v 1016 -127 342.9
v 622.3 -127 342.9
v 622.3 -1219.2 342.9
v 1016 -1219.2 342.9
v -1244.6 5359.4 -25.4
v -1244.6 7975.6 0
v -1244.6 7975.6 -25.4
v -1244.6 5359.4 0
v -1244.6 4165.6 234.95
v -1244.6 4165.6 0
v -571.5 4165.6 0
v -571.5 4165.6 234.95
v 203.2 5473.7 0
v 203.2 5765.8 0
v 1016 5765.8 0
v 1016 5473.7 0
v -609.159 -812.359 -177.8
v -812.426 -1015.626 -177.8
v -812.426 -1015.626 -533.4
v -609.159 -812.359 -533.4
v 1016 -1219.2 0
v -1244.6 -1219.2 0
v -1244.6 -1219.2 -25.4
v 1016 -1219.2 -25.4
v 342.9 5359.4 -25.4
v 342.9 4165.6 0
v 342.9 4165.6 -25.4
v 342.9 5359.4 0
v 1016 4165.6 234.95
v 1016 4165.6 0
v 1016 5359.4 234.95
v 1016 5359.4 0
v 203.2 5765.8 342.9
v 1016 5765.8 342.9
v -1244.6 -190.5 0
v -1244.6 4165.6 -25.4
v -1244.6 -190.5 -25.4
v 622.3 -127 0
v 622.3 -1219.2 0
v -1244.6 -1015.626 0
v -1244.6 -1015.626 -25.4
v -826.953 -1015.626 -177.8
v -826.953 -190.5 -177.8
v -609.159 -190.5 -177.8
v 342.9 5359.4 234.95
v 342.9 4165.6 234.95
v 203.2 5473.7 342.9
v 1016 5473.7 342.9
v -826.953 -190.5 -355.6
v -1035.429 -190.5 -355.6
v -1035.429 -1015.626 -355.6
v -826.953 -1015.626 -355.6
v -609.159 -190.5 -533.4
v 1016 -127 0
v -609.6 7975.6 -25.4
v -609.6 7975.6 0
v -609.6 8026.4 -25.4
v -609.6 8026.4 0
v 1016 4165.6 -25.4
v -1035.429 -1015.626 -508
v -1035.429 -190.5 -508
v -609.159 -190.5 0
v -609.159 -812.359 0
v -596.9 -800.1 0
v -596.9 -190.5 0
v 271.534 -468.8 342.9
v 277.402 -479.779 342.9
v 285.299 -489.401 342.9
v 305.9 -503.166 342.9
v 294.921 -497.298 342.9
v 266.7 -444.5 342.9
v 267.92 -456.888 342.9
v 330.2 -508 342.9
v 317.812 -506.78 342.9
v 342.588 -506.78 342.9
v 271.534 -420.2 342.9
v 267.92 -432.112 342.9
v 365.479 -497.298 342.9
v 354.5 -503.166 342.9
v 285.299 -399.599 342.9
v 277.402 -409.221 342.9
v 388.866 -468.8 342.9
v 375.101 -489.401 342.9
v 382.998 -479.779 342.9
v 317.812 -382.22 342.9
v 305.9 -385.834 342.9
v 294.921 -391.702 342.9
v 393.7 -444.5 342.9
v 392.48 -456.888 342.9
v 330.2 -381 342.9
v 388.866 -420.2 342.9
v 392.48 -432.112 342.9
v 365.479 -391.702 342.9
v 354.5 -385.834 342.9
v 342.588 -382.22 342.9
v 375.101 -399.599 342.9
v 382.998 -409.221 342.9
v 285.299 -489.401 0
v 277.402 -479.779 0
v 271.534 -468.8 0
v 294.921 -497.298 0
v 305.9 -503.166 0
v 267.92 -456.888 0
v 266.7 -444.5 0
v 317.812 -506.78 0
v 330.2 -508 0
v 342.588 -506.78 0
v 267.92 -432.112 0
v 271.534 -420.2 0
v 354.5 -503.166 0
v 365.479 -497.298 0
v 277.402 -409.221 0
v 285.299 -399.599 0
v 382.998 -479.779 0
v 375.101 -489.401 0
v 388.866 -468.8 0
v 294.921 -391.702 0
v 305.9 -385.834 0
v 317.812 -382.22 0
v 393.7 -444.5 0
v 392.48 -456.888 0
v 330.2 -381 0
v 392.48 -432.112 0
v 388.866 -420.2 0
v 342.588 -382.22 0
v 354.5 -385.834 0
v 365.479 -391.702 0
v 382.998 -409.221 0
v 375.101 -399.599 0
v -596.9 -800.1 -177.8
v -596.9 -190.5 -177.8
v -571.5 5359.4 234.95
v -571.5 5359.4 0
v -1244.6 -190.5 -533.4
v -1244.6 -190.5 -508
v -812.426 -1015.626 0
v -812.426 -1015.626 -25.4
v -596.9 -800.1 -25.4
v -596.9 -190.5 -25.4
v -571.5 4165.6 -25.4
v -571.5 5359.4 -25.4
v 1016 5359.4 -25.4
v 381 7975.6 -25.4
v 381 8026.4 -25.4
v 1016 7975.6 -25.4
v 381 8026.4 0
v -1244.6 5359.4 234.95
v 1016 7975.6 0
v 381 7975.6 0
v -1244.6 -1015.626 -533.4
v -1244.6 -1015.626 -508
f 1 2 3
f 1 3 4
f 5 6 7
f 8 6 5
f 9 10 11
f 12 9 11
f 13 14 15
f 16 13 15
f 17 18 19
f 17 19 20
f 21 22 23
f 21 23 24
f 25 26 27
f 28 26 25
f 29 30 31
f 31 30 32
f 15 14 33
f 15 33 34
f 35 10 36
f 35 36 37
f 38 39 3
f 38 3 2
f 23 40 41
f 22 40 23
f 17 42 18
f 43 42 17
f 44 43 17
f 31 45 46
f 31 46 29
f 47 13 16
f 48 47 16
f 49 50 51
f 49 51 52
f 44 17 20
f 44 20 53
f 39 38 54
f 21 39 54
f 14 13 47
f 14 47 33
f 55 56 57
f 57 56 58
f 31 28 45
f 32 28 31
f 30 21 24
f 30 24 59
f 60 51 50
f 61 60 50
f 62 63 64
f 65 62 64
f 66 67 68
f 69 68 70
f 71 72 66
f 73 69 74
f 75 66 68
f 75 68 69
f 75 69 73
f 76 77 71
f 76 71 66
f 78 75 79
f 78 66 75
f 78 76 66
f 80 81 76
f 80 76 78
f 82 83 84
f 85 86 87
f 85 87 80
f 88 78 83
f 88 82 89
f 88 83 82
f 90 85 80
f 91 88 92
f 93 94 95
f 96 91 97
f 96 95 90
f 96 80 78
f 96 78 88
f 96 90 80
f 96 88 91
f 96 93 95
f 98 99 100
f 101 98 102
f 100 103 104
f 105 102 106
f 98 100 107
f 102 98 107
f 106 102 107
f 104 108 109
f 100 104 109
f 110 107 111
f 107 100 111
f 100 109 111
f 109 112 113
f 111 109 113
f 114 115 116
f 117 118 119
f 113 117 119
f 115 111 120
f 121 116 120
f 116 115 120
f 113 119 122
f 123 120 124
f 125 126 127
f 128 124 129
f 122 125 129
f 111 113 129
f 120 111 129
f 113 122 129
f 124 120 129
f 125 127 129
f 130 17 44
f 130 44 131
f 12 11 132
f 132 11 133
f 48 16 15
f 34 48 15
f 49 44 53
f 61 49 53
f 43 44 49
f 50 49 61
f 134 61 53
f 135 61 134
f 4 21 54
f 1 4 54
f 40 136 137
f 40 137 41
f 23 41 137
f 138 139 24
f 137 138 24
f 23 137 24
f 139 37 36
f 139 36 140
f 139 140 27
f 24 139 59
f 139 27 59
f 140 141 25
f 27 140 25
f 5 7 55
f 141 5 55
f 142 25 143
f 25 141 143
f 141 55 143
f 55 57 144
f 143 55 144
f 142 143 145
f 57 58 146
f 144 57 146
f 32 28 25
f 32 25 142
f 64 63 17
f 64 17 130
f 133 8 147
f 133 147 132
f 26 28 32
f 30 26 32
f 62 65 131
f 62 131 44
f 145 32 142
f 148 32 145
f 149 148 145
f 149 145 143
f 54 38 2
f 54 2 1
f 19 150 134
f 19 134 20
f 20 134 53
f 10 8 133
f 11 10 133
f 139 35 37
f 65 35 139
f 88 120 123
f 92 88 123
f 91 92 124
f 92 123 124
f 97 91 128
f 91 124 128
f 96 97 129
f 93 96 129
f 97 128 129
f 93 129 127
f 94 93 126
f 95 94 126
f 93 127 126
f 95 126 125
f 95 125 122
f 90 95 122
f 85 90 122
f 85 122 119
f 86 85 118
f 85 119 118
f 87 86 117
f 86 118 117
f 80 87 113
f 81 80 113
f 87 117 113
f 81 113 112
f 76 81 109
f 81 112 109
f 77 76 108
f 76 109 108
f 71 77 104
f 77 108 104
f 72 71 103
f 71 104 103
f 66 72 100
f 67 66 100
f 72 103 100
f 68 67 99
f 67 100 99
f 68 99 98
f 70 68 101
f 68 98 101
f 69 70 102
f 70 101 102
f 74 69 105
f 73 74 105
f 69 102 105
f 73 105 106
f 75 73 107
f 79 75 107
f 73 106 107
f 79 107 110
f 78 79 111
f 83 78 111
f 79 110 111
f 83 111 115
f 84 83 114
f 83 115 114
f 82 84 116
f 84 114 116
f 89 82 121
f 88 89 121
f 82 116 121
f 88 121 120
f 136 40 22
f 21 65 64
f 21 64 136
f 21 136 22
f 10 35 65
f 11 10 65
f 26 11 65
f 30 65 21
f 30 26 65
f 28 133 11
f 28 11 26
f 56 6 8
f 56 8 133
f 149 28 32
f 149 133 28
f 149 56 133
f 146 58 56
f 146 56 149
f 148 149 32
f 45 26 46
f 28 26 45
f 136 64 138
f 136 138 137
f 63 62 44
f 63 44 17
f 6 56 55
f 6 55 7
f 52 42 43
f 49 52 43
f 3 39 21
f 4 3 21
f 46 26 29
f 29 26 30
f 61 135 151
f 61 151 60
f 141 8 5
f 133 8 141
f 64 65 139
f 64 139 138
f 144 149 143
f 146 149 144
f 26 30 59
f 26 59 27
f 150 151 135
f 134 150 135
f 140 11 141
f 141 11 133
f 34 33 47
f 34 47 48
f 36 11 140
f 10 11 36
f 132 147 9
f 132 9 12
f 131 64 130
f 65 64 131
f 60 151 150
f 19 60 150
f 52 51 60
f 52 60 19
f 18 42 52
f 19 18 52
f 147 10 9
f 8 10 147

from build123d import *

# Parameters (mm, degrees)
F0_W      = 1016
F0_H      = 1930.4
F0_W_2    = 914.4
F0_H_2    = 1193.8
F0_W_3    = 990.6
F0_H_3    = 50.8
F1_DEPTH  = 25.4
F0_W_4    = 673.1
F2_DEPTH  = 234.95
F4_W      = 812.8
F4_H      = 292.1
F5_DEPTH  = 342.9
F4_R      = 63.5
F4_W_2    = 393.7
F4_H_2    = 1092.2
F6_DEPTH  = 177.8
F0_W_5    = 209.1705223083
F0_H_4    = 825.1261469057
F0_W_6    = 208.4766030312
F7_DEPTH  = 533.4
F8_DEPTH  = 508
F9_DEPTH  = 355.6
F10_DEPTH = 177.8


with BuildPart() as f1:
    # F0 (on Top) → F1 (new body)
    with BuildSketch(Plane.XY):
        Polygon((-1244.6, 0), (0, 0), (0, 1930.4), (-203.2, 1930.4), (-203.2, 4064), (1016, 4064), (1016, 4165.6), (342.9, 4165.6), (-571.5, 4165.6), (-1244.6, 4165.6), (-1244.6, 1651), (-635, 1270), (-635, 635), (-1244.6, 635), align=None)
        Polygon((-203.2, 1930.4), (0, 1930.4), (1016, 1930.4), (1016, 4064), (-203.2, 4064), align=None)
        with Locations((508, 965.2)):
            Rectangle(F0_W, F0_H)
        Polygon((-1244.6, 1244.6), (-1244.6, 635), (-635, 635), (-635, 1270), (-1244.6, 1651), align=None)
        with Locations((-114.3, 4762.5)):
            Rectangle(F0_W_2, F0_H_2)
        Polygon((342.9, 5359.4), (1016, 5359.4), (1016, 7975.6), (381, 7975.6), (-609.6, 7975.6), (-1244.6, 7975.6), (-1244.6, 5359.4), (-571.5, 5359.4), align=None)
        with Locations((-114.3, 8001)):
            Rectangle(F0_W_3, F0_H_3)
        Polygon((1016, 0), (0, 0), (-1244.6, 0), (-1244.6, -190.5), (-1035.4294776917, -190.5), (-826.9528746605, -190.5), (-609.1586947441, -190.5), (-596.9, -190.5), (-596.9, -800.1), (-609.1586947441, -812.3586947441), (-812.4261469057, -1015.6261469057), (-826.9528746605, -1015.6261469057), (-1035.4294776917, -1015.6261469057), (-1244.6, -1015.6261469057), (-1244.6, -1219.2), (1016, -1219.2), align=None)
    extrude(amount=-F1_DEPTH)


with BuildPart() as f2:
    # F0 (on Top) → F2 (new body)
    with BuildSketch(Plane.XY):
        with Locations((-908.05, 4762.5)):
            Rectangle(F0_W_4, F0_H_2)
    extrude(amount=F2_DEPTH)


with BuildPart() as f2b:
    # F0 (on Top) → F2, piece 2 (new body)
    with BuildSketch(Plane.XY):
        with Locations((679.45, 4762.5)):
            Rectangle(F0_W_4, F0_H_2)
    extrude(amount=F2_DEPTH)


with BuildPart() as f5:
    # F4 (on face) → F5 (new body)
    with BuildSketch(Plane.XY):
        with Locations((609.6, 5619.75)):
            Rectangle(F4_W, F4_H)
    extrude(amount=F5_DEPTH)


with BuildPart() as f5b:
    # F4 (on face) → F5, piece 2 (new body)
    with BuildSketch(Plane.XY):
        with Locations((330.2, -444.5)):
            Circle(F4_R)
    extrude(amount=F5_DEPTH)


with BuildPart() as f5c:
    # F4 (on face) → F5, piece 3 (new body)
    with BuildSketch(Plane.XY):
        with Locations((819.15, -673.1)):
            Rectangle(F4_W_2, F4_H_2)
    extrude(amount=F5_DEPTH)


with BuildPart() as f6:
    # F0 (on Top) → F6 (new body)
    with BuildSketch(Plane.XY):
        Polygon((-596.9, -190.5), (-609.1586947441, -190.5), (-609.1586947441, -812.3586947441), (-596.9, -800.1), align=None)
    extrude(amount=-F6_DEPTH)


with BuildPart() as f7:
    # F0 (on Top) → F7 (new body)
    with BuildSketch(Plane.XY):
        with Locations((-1140.0147388458, -603.0630734528)):
            Rectangle(F0_W_5, F0_H_4)
        with Locations((-931.1911761761, -603.0630734528)):
            Rectangle(F0_W_6, F0_H_4)
        Polygon((-609.1586947441, -190.5), (-826.9528746605, -190.5), (-826.9528746605, -1015.6261469057), (-812.4261469057, -1015.6261469057), (-609.1586947441, -812.3586947441), align=None)
    extrude(amount=-F7_DEPTH)

    # F0 (on Top) → F8 (cut)
    with BuildSketch(Plane.XY):
        with Locations((-1140.0147388458, -603.0630734528)):
            Rectangle(F0_W_5, F0_H_4)
    extrude(amount=-F8_DEPTH, mode=Mode.SUBTRACT)

    # F0 (on Top) → F9 (cut)
    with BuildSketch(Plane.XY):
        with Locations((-931.1911761761, -603.0630734528)):
            Rectangle(F0_W_6, F0_H_4)
    extrude(amount=-F9_DEPTH, mode=Mode.SUBTRACT)

    # F0 (on Top) → F10 (cut)
    with BuildSketch(Plane.XY):
        Polygon((-609.1586947441, -190.5), (-826.9528746605, -190.5), (-826.9528746605, -1015.6261469057), (-812.4261469057, -1015.6261469057), (-609.1586947441, -812.3586947441), align=None)
    extrude(amount=-F10_DEPTH, mode=Mode.SUBTRACT)


solid = Compound([f1.part, f2.part, f2b.part, f5.part, f5b.part, f5c.part, f6.part, f7.part])
